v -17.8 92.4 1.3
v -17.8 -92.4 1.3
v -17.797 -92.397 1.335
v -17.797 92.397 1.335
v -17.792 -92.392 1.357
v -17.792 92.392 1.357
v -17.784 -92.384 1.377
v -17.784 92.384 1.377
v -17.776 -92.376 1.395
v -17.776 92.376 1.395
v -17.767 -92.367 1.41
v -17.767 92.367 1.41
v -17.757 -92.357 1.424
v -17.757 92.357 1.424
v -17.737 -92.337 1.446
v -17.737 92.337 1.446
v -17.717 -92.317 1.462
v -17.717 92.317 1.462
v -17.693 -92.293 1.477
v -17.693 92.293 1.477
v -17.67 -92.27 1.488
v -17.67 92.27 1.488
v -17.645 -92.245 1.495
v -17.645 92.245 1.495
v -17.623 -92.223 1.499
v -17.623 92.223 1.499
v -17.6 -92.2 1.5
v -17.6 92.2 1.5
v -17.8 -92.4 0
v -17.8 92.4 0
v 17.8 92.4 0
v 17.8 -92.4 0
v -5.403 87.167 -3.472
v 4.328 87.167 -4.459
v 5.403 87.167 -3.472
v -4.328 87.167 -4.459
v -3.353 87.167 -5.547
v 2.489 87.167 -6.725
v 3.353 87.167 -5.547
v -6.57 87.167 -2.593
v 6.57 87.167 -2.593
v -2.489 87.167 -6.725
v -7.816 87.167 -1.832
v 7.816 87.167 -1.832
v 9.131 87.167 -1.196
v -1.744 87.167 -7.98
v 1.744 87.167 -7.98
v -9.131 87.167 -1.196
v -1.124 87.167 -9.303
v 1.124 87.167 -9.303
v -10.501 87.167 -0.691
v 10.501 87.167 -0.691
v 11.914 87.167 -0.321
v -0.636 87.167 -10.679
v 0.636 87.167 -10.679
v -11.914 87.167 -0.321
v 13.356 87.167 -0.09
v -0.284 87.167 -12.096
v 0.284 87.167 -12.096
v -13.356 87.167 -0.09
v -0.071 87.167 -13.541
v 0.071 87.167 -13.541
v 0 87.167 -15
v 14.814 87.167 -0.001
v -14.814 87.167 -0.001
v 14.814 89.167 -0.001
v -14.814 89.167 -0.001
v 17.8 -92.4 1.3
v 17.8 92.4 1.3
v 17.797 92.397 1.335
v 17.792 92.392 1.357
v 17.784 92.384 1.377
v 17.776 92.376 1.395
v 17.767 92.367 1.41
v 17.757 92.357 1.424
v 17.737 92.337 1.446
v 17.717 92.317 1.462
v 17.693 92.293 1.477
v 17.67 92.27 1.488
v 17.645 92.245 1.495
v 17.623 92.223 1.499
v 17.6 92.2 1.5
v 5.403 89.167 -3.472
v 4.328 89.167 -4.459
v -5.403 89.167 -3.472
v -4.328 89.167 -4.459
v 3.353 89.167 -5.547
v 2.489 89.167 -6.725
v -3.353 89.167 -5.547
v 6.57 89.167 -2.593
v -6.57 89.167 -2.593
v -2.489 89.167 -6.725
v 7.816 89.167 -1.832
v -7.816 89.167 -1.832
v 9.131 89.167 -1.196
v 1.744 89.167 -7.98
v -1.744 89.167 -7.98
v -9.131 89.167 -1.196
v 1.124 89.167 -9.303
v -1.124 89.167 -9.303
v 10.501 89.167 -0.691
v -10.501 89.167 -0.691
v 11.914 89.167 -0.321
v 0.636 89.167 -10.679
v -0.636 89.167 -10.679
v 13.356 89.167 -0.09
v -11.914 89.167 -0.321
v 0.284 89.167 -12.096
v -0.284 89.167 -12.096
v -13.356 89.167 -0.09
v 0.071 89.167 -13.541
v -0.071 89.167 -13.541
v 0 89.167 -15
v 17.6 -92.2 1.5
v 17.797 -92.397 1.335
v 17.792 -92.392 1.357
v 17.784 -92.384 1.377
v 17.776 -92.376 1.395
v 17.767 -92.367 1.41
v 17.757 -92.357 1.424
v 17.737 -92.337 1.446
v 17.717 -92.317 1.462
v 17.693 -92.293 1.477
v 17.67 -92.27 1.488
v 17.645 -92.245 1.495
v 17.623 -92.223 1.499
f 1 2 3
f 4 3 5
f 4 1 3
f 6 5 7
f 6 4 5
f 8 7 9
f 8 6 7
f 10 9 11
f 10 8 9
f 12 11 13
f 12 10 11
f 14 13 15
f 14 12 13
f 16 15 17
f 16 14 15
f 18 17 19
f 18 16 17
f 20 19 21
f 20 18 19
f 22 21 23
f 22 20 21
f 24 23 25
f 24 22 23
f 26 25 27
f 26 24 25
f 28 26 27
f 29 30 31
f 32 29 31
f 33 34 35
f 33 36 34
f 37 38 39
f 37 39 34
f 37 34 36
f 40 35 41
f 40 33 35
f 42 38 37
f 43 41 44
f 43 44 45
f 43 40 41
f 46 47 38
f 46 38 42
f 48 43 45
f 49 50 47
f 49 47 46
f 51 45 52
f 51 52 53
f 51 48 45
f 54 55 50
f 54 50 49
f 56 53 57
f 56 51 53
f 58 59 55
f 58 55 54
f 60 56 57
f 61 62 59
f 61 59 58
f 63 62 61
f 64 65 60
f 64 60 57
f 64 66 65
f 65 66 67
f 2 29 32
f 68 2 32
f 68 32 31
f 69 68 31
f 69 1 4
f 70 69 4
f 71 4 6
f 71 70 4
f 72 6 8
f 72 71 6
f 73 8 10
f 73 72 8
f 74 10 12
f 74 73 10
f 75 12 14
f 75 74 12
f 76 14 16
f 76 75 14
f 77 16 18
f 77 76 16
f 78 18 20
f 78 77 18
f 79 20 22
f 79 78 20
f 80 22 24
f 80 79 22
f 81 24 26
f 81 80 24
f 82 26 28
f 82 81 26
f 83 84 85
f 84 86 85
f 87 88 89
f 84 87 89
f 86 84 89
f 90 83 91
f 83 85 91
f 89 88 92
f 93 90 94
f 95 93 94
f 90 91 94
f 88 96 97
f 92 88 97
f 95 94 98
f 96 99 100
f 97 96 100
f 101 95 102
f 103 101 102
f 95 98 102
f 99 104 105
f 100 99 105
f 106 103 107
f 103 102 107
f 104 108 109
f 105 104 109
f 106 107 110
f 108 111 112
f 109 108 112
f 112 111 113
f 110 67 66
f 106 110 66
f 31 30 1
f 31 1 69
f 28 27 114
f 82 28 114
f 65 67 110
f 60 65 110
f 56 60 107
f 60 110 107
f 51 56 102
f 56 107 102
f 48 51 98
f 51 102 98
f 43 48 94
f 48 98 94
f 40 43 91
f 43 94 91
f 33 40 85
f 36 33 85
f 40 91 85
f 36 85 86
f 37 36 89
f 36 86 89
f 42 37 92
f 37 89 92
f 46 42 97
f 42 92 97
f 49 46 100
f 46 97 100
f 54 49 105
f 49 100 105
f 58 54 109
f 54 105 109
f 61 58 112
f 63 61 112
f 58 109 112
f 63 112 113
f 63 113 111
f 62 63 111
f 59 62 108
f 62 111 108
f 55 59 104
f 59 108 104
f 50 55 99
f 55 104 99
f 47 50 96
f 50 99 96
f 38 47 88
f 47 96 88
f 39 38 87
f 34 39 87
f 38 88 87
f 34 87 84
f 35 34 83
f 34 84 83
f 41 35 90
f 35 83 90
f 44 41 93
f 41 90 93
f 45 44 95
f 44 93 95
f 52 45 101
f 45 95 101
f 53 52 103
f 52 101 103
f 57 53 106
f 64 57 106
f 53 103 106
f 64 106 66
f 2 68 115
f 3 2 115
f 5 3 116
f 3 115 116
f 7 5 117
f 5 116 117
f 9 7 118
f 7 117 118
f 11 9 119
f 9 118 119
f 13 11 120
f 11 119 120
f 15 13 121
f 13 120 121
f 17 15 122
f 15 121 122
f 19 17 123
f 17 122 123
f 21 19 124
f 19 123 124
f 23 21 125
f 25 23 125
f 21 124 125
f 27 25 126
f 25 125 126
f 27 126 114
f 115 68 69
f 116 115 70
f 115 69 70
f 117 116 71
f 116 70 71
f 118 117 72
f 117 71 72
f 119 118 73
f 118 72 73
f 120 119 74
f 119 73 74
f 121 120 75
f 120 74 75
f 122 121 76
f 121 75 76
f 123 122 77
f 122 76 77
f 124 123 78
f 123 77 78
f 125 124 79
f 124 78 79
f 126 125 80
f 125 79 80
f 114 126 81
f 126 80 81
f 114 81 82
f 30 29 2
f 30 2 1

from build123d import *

# Parameters (mm, degrees)
SKETCH1_W           = 35.6
SKETCH1_H           = 184.8
BOSS_EXTRUDE1_DEPTH = 1.5
FILLET1_R           = 0.2
BOSS_EXTRUDE2_DEPTH = 2


with BuildPart() as part:
    # Sketch1 → Boss-Extrude1 (new body)
    with BuildSketch(Plane.XY):
        Rectangle(SKETCH1_W, SKETCH1_H)
    extrude(amount=BOSS_EXTRUDE1_DEPTH)

    # Fillet1
    fillet1_edges = [part.edges().sort_by_distance(p)[0] for p in [
        (-17.8, 0, 1.5),
        (0, -92.4, 1.5),
        (17.8, 0, 1.5),
        (0, 92.4, 1.5),
    ]]
    fillet(fillet1_edges, radius=FILLET1_R)


with BuildPart() as body_2:
    # Sketch2 → Boss-Extrude2 (new body)
    with BuildSketch(Plane(origin=(0, 89.167036502, 0), x_dir=(1, 0, 0), z_dir=(0, 1, 0))):
        with BuildLine():
            Line((14.81369991, 0.001156969), (-14.81369991, 0.001156969))
            ThreePointArc((-14.81369991, 0.001156969), (-4.327734511, 4.459471108), (0, 15))
            ThreePointArc((0, 15), (4.327734511, 4.459471108), (14.81369991, 0.001156969))
        make_face()
    extrude(amount=-BOSS_EXTRUDE2_DEPTH)


solid = Compound([part.part, body_2.part])
